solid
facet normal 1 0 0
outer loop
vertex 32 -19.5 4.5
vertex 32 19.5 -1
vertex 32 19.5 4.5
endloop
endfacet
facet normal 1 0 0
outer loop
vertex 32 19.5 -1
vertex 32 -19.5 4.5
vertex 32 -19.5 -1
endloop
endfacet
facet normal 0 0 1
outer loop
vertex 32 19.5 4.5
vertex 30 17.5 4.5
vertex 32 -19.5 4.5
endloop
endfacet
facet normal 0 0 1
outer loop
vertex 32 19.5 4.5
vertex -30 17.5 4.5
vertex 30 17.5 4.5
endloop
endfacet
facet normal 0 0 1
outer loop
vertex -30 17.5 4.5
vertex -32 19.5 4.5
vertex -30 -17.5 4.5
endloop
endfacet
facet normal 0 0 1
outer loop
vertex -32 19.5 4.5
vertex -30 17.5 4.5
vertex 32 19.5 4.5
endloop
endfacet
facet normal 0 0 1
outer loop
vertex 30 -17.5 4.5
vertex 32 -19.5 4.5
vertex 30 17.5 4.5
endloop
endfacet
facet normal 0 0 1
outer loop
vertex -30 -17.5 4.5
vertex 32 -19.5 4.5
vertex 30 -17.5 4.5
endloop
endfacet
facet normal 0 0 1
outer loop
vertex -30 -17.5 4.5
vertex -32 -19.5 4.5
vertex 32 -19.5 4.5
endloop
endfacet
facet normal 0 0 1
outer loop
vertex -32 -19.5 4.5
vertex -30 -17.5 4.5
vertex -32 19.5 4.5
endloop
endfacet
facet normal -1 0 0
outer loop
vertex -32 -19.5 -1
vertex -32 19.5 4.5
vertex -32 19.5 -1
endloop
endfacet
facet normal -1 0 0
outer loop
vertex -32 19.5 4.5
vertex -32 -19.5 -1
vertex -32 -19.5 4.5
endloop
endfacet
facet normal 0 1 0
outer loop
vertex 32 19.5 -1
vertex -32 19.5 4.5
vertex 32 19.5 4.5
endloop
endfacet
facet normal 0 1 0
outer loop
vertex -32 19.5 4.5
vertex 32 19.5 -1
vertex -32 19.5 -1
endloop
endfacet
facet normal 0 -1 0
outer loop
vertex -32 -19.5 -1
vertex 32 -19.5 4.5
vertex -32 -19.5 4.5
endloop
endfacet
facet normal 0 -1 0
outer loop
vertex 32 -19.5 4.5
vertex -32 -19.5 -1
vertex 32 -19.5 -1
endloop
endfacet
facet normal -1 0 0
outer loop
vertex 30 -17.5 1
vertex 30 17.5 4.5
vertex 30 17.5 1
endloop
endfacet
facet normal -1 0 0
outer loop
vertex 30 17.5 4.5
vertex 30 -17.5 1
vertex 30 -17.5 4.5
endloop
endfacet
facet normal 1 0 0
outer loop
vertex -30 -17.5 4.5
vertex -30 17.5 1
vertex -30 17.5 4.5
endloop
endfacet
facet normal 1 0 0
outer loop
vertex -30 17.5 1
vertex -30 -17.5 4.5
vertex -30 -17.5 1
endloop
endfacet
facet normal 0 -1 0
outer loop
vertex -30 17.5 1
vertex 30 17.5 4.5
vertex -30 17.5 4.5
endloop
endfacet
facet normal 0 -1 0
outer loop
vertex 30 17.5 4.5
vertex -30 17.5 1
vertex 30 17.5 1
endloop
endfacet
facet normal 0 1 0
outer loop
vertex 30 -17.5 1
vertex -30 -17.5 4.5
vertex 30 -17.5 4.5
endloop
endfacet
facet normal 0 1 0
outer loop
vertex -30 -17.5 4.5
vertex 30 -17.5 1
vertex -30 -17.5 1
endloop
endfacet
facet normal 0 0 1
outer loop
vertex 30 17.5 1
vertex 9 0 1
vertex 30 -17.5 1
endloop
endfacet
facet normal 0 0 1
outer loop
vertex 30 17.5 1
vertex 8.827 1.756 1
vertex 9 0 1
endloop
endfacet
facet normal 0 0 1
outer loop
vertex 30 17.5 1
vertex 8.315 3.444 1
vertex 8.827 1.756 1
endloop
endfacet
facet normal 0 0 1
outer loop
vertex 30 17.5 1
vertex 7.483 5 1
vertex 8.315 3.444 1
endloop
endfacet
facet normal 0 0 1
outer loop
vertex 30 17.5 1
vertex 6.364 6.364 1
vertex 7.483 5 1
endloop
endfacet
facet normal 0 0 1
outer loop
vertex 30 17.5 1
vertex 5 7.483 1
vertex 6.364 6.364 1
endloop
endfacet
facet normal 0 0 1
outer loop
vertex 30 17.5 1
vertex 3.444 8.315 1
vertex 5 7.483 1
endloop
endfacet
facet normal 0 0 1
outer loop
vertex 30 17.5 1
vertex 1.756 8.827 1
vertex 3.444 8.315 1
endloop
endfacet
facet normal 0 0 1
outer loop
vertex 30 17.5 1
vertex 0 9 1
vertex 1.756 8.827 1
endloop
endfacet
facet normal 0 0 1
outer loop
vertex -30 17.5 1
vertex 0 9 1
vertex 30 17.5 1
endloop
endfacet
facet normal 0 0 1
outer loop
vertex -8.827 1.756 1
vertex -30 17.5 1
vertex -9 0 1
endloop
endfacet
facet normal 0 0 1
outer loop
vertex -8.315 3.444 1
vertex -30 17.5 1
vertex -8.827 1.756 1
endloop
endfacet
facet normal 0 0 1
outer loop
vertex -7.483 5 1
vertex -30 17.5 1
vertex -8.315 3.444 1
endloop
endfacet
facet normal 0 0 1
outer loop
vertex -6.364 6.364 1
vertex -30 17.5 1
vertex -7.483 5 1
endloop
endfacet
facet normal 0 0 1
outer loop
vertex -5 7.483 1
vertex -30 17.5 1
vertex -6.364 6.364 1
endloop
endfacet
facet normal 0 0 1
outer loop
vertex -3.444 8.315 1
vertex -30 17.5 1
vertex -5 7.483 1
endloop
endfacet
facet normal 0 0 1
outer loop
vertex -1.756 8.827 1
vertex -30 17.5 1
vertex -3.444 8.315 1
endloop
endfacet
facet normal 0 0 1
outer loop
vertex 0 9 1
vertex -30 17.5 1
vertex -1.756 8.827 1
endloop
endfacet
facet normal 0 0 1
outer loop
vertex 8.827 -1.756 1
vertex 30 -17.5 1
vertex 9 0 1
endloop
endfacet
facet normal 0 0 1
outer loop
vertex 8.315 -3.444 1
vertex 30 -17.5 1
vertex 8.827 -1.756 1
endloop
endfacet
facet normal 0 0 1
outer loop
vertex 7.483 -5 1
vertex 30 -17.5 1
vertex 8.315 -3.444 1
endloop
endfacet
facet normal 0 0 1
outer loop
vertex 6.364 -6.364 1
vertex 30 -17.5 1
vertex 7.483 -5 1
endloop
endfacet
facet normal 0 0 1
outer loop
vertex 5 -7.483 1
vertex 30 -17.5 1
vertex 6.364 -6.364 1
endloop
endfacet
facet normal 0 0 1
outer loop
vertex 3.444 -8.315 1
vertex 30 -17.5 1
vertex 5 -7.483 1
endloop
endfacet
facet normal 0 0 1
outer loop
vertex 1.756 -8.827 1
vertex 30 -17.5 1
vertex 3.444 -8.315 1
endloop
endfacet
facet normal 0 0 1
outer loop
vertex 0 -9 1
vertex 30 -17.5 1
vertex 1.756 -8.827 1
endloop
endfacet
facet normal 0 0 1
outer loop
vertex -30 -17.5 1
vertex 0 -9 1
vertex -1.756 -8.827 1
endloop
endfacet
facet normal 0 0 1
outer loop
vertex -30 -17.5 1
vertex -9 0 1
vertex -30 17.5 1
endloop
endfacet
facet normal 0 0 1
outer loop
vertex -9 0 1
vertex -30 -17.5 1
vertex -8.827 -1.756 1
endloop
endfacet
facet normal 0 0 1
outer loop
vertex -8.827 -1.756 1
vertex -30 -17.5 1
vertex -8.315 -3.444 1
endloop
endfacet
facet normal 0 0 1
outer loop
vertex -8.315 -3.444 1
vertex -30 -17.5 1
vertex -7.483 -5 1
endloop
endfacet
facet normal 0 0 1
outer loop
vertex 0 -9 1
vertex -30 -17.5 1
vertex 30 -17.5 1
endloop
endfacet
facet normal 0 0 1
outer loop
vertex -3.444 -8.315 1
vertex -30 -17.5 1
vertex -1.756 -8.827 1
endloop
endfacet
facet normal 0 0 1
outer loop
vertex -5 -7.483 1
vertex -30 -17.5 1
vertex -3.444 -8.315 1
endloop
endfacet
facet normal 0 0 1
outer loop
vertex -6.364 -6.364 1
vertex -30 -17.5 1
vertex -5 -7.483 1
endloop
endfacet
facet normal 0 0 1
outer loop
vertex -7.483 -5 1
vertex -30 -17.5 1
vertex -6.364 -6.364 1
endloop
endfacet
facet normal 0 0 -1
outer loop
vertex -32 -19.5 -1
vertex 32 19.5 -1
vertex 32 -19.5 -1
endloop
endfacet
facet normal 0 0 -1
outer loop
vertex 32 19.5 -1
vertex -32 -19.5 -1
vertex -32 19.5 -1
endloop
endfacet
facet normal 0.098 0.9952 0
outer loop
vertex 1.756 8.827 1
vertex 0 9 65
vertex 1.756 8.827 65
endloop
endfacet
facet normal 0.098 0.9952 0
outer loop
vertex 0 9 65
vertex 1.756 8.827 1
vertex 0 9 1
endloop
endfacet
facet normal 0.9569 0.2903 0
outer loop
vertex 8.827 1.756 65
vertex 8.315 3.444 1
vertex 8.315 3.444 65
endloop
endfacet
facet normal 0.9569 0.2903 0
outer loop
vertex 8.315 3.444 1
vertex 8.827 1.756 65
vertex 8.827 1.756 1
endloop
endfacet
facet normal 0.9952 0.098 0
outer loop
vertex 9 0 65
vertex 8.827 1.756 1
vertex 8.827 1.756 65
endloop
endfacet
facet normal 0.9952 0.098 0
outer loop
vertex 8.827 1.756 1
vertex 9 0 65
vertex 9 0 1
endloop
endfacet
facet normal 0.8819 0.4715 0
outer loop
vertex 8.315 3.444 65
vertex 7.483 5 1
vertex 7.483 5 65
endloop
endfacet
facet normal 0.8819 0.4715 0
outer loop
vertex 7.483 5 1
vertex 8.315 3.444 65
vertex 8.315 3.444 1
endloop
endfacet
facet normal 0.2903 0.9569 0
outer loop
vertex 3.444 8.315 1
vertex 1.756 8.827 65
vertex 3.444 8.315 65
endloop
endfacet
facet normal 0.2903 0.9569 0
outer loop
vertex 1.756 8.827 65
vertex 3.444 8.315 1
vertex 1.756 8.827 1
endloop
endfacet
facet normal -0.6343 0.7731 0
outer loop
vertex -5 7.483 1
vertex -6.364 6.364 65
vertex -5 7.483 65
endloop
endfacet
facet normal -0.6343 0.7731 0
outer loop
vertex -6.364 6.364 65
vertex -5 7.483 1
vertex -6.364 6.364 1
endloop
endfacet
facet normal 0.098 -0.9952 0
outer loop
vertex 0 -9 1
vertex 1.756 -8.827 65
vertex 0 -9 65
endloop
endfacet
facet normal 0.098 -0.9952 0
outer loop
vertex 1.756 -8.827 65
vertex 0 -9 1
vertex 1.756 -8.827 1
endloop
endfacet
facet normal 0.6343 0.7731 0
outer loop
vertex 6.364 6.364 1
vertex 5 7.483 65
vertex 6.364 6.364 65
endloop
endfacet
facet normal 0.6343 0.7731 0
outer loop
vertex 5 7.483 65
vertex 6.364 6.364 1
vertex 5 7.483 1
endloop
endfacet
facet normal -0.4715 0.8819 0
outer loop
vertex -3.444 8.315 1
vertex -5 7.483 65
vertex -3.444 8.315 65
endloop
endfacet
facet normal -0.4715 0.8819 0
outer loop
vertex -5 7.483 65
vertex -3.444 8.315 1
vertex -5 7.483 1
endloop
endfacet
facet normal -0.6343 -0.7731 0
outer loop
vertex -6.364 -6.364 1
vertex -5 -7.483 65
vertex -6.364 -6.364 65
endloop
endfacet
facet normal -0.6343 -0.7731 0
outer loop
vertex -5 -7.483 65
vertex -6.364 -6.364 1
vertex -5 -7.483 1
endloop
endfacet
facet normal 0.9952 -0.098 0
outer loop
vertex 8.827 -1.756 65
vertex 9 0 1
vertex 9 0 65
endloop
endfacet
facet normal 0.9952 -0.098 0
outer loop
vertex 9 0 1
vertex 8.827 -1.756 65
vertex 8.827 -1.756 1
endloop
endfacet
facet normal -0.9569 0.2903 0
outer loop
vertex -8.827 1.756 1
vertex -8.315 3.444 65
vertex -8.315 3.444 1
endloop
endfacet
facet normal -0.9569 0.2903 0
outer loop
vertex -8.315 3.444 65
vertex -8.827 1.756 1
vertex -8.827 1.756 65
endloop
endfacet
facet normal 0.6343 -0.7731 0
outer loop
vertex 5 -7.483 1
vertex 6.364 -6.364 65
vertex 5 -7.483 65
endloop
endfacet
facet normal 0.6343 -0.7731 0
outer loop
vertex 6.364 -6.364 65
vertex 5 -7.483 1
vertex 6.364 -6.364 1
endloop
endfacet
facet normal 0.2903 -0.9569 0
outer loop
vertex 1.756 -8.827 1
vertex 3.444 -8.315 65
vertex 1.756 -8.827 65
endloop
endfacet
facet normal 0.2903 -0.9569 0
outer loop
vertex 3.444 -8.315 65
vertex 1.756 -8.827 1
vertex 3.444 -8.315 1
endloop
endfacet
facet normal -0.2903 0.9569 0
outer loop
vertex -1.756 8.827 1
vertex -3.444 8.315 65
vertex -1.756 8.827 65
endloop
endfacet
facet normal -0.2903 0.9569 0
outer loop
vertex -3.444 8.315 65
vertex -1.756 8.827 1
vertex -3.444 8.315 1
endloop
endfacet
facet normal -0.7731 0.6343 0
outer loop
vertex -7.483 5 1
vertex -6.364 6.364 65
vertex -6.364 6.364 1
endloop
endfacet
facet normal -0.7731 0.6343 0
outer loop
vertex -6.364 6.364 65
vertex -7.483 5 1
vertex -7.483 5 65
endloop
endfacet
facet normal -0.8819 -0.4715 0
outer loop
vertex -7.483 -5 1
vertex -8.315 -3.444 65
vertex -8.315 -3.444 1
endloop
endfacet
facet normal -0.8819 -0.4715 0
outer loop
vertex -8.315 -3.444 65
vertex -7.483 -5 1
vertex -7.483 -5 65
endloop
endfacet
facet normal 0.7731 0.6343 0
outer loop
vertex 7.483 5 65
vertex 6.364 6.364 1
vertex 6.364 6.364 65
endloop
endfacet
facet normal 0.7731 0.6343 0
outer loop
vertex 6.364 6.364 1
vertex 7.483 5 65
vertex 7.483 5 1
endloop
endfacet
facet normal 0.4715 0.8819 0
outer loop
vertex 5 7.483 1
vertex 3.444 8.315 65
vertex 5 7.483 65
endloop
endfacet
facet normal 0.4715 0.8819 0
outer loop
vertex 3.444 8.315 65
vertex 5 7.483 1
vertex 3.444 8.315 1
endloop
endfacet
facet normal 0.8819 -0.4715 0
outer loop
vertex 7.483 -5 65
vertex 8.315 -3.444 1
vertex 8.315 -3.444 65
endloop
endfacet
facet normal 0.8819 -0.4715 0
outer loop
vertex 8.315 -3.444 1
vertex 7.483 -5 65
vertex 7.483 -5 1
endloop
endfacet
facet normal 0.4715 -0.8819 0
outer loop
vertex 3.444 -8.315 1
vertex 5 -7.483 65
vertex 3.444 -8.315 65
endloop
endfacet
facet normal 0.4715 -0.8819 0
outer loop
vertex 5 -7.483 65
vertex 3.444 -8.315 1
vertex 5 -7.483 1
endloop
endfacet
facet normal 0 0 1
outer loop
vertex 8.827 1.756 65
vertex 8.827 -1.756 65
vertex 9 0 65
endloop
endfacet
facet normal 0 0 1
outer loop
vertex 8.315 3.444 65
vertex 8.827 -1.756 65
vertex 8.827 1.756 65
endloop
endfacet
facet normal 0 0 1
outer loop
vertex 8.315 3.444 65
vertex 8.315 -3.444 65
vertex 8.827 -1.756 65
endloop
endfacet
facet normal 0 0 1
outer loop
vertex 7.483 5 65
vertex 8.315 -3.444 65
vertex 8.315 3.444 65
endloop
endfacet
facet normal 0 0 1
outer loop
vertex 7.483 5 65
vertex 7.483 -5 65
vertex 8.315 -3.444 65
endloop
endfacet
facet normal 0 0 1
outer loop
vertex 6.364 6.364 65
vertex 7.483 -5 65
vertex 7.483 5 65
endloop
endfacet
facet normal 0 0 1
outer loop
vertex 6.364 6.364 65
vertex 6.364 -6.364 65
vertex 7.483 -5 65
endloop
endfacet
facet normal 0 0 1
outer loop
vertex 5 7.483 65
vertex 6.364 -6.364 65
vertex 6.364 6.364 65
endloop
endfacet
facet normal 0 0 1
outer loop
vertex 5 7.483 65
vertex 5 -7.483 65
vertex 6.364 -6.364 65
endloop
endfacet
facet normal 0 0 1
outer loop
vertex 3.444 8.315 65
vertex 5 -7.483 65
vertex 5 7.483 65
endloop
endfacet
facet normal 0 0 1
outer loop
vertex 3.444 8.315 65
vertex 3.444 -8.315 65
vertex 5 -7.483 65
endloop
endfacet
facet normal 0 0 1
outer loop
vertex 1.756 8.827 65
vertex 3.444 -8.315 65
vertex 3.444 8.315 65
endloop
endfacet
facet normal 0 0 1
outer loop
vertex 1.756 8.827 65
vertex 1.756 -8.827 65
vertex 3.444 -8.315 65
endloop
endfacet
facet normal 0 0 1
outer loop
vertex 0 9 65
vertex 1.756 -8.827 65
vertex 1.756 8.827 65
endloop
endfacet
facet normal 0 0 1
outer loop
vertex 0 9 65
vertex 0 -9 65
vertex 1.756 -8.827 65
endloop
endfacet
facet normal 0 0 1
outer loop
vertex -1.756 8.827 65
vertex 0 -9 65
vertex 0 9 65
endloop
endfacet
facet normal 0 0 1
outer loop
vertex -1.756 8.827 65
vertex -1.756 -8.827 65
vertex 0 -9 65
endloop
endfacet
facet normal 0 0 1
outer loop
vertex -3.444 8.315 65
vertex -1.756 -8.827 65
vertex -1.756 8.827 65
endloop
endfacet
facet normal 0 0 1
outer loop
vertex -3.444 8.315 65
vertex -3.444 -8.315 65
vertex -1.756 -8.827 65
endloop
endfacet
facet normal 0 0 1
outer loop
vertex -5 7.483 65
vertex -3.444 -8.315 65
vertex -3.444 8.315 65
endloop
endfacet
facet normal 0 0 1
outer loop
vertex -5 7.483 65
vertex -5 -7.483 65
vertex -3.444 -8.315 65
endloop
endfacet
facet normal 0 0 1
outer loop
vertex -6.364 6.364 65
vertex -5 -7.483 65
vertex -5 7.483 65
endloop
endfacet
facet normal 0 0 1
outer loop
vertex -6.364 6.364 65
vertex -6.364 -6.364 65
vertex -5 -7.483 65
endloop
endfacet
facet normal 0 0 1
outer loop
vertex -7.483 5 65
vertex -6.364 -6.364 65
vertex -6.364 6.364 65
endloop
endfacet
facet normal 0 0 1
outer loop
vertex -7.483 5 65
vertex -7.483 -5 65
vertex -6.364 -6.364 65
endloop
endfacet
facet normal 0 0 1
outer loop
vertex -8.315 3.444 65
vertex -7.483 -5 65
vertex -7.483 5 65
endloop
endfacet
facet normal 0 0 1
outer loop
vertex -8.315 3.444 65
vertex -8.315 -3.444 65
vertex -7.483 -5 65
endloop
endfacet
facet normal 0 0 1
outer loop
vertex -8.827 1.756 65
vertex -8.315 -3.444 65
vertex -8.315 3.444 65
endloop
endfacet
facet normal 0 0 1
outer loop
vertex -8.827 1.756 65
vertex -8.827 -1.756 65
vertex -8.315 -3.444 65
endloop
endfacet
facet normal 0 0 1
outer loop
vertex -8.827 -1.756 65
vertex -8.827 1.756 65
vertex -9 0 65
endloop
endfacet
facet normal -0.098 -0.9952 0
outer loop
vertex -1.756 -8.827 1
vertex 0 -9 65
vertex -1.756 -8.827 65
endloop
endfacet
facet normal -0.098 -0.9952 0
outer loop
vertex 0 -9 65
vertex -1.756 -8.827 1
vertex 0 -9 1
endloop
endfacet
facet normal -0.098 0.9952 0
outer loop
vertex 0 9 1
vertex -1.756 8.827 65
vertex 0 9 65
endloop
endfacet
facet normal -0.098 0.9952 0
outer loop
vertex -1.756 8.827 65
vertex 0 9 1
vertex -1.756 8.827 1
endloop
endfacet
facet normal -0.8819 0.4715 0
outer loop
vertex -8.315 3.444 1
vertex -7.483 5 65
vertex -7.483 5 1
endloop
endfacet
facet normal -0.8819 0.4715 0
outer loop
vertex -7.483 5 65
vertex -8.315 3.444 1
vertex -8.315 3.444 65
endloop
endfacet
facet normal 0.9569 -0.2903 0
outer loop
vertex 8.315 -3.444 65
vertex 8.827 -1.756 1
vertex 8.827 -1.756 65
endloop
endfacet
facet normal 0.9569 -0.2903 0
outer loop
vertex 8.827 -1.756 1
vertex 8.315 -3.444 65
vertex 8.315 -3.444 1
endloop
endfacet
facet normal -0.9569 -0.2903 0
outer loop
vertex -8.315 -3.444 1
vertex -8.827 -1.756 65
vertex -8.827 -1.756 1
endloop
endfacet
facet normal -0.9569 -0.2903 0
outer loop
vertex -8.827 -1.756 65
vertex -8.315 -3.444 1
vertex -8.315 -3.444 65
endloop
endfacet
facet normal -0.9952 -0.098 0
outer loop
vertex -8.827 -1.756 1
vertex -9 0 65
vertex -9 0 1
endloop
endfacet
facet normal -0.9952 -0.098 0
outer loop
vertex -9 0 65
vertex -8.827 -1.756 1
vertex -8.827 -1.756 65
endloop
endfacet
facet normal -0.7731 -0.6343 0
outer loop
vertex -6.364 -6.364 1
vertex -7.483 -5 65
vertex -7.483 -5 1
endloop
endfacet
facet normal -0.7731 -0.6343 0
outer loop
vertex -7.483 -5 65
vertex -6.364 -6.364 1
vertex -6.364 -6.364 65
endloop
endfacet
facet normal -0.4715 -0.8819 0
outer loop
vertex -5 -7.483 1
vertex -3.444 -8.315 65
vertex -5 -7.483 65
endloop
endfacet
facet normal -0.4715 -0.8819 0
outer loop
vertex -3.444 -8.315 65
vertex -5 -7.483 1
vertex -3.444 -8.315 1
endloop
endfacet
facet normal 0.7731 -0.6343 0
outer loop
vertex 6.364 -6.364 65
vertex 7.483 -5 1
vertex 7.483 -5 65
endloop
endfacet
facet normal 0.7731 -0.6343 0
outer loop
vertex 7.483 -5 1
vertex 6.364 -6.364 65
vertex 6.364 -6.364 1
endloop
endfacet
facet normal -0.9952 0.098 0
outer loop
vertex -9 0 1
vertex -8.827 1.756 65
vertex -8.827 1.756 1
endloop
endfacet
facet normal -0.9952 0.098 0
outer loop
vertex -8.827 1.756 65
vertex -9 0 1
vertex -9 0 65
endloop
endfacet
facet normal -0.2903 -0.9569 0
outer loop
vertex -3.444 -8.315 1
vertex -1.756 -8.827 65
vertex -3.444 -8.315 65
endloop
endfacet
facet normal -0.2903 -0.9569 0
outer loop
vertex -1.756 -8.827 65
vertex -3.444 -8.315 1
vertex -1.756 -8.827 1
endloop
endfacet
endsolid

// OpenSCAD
// file: 18650.scad
  echo ("Rabota Baltatchev ");
      
      acc18650();
      
      module acc18650() {
          color("violet")
          cylinder(d=18, h=65, $fn=32);
      }
// main file
use <18650.scad>
      
      echo("Rabota Baltatchev ");
      w_frame = 65;
      d_frame = 5;
      h_frame = 41;
      thickness_frame = 4;
      thickness_walls = 2;
      thickness_bottom = 2;
      h_walls = 4;
      
      w_back = 60;
      h_back = 35;
      thickness_back = 1;
      
      kit_frame();
      acc18650();
      
      module kit_frame() {
          bottom();
          color("red")
          translate([0, 0, h_walls/2+thickness_back/2])
          walls();
      }
      
      
      module walls(){
          difference(){
              cube([w_back + 2 * thickness_walls, h_back + 2 * thickness_walls, h_walls], center = true);
              color("red")
              cube([w_back, h_back, h_walls + 1], center = true);
          }   
      }
      
      //rotate([90, 0, 0])
      //translate([0, 0, 3]);
      //backlight()
      
      module bottom() {
          cube([w_back+2*thickness_walls, h_back+2*thickness_walls, thickness_bottom], center=true);
      }
      
      
      module backlight() {
        color("lightgreen")
        cube([w_back, h_back, thickness_back], center=true);
      }
      
      module frame1() {
        difference(){
          cube([w_frame,d_frame,h_frame],center=true);
          color("red")
          cube([w_frame-2*thickness_frame, d_frame+1, h_frame-2*thickness_frame], center = true);    
        }
      }
